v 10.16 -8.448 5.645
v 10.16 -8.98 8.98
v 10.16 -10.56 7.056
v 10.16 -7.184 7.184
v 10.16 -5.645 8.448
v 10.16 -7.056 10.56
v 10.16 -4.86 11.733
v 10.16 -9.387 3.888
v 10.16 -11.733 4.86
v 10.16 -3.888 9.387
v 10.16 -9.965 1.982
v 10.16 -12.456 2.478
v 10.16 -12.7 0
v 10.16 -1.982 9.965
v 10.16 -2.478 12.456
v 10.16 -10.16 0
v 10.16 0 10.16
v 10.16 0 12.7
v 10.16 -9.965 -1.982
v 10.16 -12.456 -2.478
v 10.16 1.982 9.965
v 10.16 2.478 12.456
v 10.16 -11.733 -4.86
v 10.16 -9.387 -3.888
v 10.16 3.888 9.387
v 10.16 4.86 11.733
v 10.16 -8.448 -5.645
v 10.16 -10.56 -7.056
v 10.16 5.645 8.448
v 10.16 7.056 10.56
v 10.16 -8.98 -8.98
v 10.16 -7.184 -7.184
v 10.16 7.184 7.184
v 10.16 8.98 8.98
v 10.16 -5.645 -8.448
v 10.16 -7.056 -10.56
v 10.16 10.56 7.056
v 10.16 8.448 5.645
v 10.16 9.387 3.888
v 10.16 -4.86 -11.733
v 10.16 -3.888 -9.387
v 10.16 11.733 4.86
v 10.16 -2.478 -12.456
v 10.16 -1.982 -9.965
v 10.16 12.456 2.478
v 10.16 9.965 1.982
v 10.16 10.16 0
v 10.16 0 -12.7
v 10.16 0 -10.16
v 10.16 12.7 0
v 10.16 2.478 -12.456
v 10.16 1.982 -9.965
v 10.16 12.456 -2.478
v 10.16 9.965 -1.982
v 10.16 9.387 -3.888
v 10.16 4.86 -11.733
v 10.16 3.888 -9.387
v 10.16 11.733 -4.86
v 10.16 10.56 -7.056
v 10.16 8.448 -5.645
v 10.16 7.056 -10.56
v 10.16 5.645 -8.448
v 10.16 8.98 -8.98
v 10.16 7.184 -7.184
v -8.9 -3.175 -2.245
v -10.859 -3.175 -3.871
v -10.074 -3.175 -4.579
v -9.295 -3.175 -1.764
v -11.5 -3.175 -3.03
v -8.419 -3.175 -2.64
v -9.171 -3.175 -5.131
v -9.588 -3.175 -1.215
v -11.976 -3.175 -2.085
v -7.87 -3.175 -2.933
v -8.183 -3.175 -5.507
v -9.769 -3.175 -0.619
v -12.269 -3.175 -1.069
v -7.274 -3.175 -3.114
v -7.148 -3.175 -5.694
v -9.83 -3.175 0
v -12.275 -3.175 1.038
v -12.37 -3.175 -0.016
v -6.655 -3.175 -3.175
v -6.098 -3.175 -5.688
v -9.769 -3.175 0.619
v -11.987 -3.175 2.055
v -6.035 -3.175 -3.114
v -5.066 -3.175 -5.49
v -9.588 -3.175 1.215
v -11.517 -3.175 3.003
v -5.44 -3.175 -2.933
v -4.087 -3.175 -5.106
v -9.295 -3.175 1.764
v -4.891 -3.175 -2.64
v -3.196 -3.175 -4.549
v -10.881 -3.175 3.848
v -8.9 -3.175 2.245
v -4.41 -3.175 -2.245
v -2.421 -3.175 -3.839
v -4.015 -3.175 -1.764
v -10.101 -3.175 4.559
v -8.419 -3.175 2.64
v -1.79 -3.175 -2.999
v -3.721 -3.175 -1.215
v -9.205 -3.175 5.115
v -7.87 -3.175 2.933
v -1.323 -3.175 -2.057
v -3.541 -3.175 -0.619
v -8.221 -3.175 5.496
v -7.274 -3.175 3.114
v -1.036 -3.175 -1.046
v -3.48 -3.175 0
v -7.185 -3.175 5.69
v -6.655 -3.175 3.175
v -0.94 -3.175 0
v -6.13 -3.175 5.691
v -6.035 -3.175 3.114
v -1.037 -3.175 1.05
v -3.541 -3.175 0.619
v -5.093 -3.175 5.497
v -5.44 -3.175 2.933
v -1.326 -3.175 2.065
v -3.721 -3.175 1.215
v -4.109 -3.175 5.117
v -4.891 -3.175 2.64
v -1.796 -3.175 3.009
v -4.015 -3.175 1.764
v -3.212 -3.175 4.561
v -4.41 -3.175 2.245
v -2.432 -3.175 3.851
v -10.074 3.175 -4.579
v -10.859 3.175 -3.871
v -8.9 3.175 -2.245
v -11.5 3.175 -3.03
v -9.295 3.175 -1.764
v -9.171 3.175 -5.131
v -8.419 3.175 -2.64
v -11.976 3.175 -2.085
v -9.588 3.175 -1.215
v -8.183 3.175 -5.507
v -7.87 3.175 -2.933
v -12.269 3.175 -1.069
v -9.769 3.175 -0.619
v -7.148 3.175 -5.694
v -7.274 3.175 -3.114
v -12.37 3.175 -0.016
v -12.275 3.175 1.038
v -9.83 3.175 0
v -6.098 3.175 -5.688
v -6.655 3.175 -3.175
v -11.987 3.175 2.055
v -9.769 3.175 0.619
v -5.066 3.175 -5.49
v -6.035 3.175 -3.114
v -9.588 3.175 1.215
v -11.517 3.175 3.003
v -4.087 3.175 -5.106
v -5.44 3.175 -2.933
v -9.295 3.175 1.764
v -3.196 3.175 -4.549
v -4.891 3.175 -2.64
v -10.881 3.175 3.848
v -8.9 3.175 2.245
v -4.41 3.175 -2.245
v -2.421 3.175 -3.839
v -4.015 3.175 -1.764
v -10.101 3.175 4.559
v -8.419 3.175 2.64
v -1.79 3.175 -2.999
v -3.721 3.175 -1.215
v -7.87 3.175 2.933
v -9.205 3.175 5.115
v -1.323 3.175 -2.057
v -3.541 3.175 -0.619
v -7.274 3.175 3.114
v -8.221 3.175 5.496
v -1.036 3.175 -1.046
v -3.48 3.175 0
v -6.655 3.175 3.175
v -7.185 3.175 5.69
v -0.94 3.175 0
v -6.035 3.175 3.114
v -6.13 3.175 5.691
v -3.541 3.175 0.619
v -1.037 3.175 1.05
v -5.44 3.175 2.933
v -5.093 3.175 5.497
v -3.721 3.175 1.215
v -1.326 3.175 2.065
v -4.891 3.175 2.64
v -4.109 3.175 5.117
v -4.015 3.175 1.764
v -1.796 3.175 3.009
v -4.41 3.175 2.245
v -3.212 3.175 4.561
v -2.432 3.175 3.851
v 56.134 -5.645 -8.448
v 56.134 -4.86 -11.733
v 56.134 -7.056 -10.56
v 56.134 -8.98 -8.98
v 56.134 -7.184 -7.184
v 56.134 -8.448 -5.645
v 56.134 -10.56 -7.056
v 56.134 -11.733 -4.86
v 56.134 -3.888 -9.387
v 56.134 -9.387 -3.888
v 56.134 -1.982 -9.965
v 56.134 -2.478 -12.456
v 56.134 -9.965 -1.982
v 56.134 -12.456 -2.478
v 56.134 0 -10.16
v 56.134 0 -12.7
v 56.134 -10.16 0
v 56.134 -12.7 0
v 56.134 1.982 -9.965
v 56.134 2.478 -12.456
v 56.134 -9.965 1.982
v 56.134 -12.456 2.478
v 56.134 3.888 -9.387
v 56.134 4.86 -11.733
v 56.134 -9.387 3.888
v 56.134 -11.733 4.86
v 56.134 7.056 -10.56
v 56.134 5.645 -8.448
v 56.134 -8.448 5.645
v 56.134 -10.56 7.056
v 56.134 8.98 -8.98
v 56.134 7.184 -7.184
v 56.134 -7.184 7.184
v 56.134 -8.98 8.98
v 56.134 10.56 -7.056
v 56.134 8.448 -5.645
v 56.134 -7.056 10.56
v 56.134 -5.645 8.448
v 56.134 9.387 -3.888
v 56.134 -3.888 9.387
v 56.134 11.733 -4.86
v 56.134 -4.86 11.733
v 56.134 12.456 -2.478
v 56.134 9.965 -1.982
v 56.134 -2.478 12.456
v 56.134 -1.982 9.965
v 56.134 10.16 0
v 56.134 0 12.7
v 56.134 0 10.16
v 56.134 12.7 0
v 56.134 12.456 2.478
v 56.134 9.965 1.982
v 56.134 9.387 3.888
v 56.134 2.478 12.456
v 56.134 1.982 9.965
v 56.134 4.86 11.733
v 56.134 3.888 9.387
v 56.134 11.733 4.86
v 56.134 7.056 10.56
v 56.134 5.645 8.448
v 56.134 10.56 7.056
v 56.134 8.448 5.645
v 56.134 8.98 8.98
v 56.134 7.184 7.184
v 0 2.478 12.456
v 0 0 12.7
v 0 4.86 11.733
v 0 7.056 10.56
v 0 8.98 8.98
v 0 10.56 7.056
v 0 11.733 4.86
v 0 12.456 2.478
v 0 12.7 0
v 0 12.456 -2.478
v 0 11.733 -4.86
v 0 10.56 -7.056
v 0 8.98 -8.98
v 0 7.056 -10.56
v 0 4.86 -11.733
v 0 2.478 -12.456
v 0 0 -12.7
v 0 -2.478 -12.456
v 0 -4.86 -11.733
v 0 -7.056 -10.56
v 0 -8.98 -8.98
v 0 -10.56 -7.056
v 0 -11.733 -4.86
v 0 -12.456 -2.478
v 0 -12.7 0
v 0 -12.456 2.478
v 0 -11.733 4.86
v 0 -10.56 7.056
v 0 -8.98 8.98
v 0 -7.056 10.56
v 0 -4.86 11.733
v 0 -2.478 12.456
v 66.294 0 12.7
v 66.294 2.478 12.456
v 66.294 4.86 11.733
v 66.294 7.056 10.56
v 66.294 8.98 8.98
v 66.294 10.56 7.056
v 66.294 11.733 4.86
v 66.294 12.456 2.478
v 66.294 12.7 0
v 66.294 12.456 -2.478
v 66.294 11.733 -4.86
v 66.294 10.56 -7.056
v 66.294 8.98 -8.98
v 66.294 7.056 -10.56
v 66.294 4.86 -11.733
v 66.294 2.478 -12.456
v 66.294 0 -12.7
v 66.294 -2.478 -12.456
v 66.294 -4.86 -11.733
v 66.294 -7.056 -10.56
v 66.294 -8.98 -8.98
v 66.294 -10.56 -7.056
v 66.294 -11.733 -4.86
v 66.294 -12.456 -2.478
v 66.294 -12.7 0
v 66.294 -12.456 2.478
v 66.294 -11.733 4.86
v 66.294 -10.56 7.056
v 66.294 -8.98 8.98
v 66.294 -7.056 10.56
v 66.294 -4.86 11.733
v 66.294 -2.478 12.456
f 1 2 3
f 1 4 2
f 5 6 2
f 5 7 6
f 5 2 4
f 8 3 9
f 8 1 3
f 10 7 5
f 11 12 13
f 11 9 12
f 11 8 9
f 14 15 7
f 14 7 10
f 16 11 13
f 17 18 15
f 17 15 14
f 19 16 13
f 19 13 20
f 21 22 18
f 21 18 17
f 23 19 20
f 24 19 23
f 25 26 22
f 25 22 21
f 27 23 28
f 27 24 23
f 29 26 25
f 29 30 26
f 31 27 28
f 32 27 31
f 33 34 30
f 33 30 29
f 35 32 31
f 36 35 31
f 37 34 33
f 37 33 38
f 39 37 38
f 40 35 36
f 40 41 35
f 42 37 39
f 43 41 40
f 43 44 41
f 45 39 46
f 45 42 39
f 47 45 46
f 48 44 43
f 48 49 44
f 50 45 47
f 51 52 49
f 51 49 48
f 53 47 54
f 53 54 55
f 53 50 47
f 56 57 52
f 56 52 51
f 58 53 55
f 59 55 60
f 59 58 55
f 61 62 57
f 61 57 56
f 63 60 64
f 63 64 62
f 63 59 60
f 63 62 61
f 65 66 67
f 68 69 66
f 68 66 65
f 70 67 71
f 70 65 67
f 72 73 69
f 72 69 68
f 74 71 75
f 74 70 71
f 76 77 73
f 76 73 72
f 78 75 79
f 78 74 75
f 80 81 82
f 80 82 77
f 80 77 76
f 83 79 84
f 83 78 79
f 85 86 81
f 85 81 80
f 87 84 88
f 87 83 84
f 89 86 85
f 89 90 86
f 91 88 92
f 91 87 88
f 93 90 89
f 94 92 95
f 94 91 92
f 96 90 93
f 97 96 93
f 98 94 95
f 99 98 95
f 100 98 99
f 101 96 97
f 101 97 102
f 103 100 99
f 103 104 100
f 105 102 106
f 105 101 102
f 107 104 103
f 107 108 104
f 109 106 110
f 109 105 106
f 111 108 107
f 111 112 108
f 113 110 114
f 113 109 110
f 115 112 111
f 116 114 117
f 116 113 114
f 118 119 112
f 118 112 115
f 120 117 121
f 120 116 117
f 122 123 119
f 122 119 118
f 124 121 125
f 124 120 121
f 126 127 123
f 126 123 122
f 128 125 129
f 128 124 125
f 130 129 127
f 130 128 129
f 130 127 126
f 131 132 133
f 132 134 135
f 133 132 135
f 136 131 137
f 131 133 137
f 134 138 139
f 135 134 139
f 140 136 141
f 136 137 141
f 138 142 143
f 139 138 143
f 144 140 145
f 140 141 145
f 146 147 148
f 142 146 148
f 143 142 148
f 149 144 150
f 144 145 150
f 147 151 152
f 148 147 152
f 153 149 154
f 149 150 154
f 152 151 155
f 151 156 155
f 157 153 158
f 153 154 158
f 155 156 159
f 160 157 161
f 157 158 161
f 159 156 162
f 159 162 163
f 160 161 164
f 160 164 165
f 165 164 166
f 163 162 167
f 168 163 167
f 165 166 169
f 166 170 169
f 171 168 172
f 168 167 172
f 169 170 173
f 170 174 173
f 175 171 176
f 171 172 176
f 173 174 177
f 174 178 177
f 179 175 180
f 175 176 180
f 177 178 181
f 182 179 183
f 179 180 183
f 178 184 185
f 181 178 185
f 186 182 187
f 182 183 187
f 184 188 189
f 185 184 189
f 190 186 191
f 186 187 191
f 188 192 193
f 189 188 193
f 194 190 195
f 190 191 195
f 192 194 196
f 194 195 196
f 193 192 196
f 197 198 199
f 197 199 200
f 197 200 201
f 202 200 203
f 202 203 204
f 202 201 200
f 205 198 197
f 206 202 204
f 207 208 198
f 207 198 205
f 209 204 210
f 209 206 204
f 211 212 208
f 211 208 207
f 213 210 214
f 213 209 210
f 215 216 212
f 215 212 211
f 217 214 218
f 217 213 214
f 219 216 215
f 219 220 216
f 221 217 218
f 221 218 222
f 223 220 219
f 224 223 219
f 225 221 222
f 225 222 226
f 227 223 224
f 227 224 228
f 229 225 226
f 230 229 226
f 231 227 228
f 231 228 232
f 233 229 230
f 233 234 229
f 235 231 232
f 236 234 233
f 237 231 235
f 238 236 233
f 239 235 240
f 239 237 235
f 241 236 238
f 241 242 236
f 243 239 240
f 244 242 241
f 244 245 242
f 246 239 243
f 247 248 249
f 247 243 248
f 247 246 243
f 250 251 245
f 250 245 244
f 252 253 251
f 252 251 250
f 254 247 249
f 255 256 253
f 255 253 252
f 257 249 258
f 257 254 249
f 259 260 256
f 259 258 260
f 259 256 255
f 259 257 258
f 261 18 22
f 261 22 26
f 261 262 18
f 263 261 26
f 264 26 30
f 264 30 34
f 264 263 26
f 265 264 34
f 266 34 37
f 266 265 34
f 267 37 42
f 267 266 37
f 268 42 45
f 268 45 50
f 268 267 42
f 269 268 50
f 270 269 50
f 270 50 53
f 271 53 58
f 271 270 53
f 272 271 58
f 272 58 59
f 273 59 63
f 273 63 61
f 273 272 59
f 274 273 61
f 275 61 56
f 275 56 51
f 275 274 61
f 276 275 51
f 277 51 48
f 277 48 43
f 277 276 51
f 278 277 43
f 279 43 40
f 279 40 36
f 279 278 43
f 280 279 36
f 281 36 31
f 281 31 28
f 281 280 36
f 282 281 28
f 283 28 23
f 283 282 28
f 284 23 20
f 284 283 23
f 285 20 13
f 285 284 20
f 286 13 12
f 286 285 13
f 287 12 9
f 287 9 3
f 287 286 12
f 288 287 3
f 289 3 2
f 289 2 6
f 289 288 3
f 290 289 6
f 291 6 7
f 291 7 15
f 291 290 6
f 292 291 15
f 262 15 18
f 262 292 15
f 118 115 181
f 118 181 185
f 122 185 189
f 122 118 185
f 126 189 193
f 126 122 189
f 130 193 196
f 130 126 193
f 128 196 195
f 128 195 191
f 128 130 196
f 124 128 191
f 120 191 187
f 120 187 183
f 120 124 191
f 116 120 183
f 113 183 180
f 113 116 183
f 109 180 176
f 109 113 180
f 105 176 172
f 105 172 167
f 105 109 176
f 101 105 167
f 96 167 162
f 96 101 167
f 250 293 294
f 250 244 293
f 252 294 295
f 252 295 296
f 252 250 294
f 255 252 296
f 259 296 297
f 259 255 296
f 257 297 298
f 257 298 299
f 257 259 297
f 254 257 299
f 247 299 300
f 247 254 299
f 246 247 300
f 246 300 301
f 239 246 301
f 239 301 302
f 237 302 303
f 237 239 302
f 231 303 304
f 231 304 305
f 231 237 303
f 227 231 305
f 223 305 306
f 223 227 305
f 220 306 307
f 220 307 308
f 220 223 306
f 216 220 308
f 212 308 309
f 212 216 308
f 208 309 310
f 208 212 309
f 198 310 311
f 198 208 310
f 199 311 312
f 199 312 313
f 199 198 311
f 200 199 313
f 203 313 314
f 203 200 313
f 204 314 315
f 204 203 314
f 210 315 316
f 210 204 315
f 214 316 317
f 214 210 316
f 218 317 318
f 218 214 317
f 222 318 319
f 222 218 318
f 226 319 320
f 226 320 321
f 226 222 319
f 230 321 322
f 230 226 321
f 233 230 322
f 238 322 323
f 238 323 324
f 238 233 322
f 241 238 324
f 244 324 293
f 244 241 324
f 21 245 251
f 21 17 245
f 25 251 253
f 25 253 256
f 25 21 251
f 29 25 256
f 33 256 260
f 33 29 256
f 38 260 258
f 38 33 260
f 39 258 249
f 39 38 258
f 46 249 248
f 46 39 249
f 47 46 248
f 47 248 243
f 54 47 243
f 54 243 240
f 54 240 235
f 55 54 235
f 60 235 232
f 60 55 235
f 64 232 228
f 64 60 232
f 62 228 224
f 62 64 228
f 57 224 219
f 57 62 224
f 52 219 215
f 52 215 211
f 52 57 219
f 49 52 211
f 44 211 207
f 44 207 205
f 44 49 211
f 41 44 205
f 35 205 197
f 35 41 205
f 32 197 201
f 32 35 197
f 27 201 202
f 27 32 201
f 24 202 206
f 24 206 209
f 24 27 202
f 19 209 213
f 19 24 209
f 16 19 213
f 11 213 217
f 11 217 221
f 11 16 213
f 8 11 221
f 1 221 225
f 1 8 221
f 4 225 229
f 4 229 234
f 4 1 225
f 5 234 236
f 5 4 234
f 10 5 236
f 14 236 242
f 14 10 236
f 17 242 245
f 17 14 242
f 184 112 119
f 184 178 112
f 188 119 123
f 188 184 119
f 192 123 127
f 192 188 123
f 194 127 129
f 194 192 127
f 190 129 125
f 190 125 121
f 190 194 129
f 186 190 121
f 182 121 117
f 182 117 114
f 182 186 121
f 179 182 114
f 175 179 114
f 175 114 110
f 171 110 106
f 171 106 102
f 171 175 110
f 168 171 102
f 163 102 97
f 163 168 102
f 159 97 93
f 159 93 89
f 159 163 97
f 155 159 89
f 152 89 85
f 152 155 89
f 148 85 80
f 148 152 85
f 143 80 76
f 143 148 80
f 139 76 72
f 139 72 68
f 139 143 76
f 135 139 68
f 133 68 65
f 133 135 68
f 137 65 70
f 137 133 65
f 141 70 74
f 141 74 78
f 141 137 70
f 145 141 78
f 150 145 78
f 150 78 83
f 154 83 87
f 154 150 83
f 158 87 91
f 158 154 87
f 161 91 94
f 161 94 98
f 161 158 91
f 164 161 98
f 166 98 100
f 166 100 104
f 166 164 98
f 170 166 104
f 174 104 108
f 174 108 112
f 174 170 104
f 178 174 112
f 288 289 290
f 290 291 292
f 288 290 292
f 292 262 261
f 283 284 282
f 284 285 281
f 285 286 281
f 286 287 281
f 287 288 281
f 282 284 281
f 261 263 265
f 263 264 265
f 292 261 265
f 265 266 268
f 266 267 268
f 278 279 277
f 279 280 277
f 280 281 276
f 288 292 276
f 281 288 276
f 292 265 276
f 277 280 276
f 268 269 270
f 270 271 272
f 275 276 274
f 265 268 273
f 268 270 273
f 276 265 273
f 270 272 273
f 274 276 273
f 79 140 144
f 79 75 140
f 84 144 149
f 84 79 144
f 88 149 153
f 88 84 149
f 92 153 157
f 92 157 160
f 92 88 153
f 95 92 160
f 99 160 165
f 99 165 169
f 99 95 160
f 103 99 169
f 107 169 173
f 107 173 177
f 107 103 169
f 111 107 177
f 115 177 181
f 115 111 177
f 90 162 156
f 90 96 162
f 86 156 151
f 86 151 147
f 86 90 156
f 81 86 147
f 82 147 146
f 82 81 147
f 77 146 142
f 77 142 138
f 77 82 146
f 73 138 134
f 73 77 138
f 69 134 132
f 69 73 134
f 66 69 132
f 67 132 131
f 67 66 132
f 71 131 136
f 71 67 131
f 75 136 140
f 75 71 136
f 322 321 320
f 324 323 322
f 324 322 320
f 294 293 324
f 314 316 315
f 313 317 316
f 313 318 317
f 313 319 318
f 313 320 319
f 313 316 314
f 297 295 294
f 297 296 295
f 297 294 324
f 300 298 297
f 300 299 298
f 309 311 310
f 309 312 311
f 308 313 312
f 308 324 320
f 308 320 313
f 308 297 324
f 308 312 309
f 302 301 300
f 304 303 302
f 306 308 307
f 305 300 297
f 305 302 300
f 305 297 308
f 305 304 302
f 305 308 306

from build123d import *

# Parameters (mm, degrees)
F0_W     = 5.842
F0_H     = 12.7
F0_R     = 3.175
F2_DEPTH = 3.175


with BuildPart() as f1:
    # F0 (on Front) → F1 (revolve)
    with BuildSketch(Plane.XZ):
        with Locations((2.921, 6.35)):
            Rectangle(F0_W, F0_H)
        Polygon((5.842, 12.7), (5.842, 0), (66.294, 0), (66.294, 12.7), (56.134, 12.7), (56.134, 10.16), (10.16, 10.16), (10.16, 12.7), align=None)
    revolve(axis=Axis((33.147, 0, 0), (-1, 0, 0)))


with BuildPart() as f2:
    # F0 (on Front) → F2 (new body, symmetric)
    with BuildSketch(Plane.XZ):
        with BuildLine():
            ThreePointArc((-8.182663, -5.506983), (-3.195791, -4.549339), (-0.9398, 0))
            ThreePointArc((-0.9398, 0), (-4.591961, 5.329721), (-10.88063, 3.847543))
            ThreePointArc((-10.88063, 3.847543), (-12.145978, -1.583727), (-8.182663, -5.506983))
        make_face()
        with Locations((-6.6548, 0)):
            Circle(F0_R, mode=Mode.SUBTRACT)
    extrude(amount=F2_DEPTH, both=True)


solid = Compound([f1.part, f2.part])
